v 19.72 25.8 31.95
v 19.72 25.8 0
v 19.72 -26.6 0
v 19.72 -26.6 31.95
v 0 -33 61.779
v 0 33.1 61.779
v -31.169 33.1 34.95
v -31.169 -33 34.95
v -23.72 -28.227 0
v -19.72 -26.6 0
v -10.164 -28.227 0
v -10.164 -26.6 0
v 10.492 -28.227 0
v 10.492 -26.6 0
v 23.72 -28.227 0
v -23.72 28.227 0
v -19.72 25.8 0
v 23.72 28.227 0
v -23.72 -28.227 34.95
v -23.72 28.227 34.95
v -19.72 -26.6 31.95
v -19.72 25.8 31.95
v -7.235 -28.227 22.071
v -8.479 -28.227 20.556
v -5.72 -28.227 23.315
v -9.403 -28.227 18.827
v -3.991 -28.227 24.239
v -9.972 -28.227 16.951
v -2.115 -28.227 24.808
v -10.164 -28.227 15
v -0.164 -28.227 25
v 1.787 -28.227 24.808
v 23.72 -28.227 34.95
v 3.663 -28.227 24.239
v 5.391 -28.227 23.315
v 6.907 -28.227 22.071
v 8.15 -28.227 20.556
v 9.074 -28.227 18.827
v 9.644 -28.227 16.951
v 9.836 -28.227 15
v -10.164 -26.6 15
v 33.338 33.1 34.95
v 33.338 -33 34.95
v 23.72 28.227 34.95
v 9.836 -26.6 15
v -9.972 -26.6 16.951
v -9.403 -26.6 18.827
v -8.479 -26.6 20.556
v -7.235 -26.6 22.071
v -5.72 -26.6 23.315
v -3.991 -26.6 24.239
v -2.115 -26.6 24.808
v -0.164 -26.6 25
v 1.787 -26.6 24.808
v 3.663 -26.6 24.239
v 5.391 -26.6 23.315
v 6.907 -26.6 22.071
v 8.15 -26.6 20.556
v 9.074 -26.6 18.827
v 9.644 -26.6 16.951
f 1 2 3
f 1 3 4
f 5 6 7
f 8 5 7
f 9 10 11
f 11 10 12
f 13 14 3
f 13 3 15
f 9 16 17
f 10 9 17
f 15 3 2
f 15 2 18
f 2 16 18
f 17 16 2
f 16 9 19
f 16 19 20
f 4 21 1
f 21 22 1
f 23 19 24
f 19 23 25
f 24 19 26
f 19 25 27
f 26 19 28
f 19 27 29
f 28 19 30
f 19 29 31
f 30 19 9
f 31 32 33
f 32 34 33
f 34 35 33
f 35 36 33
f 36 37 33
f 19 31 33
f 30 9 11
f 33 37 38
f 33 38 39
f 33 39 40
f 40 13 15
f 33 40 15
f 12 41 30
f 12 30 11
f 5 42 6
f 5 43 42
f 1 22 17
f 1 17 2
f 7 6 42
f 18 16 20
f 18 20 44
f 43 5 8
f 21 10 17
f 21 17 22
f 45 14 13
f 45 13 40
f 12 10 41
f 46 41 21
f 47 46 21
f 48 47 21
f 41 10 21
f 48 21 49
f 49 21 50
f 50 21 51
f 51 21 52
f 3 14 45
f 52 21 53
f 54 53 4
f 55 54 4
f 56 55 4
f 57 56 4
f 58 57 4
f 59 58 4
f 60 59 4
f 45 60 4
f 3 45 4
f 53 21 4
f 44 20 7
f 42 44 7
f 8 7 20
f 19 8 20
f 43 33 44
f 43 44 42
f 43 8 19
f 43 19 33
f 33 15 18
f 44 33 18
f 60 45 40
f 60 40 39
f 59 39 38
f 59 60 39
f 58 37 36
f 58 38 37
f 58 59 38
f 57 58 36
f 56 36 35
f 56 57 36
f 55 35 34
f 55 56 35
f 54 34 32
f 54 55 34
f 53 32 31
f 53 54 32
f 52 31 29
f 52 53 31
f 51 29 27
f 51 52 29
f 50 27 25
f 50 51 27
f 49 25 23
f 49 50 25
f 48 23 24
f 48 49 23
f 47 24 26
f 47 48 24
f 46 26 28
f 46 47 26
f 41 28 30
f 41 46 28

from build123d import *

# Parameters (mm, degrees)
F0_W          = 47.4397577345
F0_H          = 56.4533136785
F1_DEPTH      = 40
F3_DEPTH      = 33
F3_DEPTH_BACK = 33.1
F5_DEPTH      = 33.3
F6_W          = 39.4397577345
F6_H          = 31.9497205708
F7_DEPTH      = 26.6
F7_DEPTH_BACK = 25.8


with BuildPart() as f1:
    # F0 (on Top) → F1 (new body)
    with BuildSketch(Plane.XY):
        Rectangle(F0_W, F0_H)
    extrude(amount=F1_DEPTH)

    # F2 (on Front) → F3 (join, two sides)
    with BuildSketch(Plane.XZ) as f3_sk:
        Polygon((33.3382274703, 34.9497205708), (0, 61.778764094), (-31.1693440729, 34.9497205708), (-28.1035822263, 34.9497205708), (29.8146836554, 34.9497205708), align=None)
    extrude(amount=F3_DEPTH)
    extrude(f3_sk.sketch, amount=-F3_DEPTH_BACK)

    # F4 (on Front) → F5 (cut)
    with BuildSketch(Plane.XZ):
        with BuildLine():
            Line((10.4915505733, 0), (9.8356730979, 15))
            ThreePointArc((9.8356730979, 15), (-0.1643269021, 25), (-10.1643269021, 15))
            Line((-10.1643269021, 15), (-10.1643269021, 0))
            Line((-10.1643269021, 0), (10.4915505733, 0))
        make_face()
    extrude(amount=F5_DEPTH, mode=Mode.SUBTRACT)

    # F6 (on Front) → F7 (cut, two sides)
    with BuildSketch(Plane.XZ) as f7_sk:
        with Locations((0, 15.9748602854)):
            Rectangle(F6_W, F6_H)
    extrude(amount=F7_DEPTH, mode=Mode.SUBTRACT)
    extrude(f7_sk.sketch, amount=-F7_DEPTH_BACK, mode=Mode.SUBTRACT)


solid = f1.part
